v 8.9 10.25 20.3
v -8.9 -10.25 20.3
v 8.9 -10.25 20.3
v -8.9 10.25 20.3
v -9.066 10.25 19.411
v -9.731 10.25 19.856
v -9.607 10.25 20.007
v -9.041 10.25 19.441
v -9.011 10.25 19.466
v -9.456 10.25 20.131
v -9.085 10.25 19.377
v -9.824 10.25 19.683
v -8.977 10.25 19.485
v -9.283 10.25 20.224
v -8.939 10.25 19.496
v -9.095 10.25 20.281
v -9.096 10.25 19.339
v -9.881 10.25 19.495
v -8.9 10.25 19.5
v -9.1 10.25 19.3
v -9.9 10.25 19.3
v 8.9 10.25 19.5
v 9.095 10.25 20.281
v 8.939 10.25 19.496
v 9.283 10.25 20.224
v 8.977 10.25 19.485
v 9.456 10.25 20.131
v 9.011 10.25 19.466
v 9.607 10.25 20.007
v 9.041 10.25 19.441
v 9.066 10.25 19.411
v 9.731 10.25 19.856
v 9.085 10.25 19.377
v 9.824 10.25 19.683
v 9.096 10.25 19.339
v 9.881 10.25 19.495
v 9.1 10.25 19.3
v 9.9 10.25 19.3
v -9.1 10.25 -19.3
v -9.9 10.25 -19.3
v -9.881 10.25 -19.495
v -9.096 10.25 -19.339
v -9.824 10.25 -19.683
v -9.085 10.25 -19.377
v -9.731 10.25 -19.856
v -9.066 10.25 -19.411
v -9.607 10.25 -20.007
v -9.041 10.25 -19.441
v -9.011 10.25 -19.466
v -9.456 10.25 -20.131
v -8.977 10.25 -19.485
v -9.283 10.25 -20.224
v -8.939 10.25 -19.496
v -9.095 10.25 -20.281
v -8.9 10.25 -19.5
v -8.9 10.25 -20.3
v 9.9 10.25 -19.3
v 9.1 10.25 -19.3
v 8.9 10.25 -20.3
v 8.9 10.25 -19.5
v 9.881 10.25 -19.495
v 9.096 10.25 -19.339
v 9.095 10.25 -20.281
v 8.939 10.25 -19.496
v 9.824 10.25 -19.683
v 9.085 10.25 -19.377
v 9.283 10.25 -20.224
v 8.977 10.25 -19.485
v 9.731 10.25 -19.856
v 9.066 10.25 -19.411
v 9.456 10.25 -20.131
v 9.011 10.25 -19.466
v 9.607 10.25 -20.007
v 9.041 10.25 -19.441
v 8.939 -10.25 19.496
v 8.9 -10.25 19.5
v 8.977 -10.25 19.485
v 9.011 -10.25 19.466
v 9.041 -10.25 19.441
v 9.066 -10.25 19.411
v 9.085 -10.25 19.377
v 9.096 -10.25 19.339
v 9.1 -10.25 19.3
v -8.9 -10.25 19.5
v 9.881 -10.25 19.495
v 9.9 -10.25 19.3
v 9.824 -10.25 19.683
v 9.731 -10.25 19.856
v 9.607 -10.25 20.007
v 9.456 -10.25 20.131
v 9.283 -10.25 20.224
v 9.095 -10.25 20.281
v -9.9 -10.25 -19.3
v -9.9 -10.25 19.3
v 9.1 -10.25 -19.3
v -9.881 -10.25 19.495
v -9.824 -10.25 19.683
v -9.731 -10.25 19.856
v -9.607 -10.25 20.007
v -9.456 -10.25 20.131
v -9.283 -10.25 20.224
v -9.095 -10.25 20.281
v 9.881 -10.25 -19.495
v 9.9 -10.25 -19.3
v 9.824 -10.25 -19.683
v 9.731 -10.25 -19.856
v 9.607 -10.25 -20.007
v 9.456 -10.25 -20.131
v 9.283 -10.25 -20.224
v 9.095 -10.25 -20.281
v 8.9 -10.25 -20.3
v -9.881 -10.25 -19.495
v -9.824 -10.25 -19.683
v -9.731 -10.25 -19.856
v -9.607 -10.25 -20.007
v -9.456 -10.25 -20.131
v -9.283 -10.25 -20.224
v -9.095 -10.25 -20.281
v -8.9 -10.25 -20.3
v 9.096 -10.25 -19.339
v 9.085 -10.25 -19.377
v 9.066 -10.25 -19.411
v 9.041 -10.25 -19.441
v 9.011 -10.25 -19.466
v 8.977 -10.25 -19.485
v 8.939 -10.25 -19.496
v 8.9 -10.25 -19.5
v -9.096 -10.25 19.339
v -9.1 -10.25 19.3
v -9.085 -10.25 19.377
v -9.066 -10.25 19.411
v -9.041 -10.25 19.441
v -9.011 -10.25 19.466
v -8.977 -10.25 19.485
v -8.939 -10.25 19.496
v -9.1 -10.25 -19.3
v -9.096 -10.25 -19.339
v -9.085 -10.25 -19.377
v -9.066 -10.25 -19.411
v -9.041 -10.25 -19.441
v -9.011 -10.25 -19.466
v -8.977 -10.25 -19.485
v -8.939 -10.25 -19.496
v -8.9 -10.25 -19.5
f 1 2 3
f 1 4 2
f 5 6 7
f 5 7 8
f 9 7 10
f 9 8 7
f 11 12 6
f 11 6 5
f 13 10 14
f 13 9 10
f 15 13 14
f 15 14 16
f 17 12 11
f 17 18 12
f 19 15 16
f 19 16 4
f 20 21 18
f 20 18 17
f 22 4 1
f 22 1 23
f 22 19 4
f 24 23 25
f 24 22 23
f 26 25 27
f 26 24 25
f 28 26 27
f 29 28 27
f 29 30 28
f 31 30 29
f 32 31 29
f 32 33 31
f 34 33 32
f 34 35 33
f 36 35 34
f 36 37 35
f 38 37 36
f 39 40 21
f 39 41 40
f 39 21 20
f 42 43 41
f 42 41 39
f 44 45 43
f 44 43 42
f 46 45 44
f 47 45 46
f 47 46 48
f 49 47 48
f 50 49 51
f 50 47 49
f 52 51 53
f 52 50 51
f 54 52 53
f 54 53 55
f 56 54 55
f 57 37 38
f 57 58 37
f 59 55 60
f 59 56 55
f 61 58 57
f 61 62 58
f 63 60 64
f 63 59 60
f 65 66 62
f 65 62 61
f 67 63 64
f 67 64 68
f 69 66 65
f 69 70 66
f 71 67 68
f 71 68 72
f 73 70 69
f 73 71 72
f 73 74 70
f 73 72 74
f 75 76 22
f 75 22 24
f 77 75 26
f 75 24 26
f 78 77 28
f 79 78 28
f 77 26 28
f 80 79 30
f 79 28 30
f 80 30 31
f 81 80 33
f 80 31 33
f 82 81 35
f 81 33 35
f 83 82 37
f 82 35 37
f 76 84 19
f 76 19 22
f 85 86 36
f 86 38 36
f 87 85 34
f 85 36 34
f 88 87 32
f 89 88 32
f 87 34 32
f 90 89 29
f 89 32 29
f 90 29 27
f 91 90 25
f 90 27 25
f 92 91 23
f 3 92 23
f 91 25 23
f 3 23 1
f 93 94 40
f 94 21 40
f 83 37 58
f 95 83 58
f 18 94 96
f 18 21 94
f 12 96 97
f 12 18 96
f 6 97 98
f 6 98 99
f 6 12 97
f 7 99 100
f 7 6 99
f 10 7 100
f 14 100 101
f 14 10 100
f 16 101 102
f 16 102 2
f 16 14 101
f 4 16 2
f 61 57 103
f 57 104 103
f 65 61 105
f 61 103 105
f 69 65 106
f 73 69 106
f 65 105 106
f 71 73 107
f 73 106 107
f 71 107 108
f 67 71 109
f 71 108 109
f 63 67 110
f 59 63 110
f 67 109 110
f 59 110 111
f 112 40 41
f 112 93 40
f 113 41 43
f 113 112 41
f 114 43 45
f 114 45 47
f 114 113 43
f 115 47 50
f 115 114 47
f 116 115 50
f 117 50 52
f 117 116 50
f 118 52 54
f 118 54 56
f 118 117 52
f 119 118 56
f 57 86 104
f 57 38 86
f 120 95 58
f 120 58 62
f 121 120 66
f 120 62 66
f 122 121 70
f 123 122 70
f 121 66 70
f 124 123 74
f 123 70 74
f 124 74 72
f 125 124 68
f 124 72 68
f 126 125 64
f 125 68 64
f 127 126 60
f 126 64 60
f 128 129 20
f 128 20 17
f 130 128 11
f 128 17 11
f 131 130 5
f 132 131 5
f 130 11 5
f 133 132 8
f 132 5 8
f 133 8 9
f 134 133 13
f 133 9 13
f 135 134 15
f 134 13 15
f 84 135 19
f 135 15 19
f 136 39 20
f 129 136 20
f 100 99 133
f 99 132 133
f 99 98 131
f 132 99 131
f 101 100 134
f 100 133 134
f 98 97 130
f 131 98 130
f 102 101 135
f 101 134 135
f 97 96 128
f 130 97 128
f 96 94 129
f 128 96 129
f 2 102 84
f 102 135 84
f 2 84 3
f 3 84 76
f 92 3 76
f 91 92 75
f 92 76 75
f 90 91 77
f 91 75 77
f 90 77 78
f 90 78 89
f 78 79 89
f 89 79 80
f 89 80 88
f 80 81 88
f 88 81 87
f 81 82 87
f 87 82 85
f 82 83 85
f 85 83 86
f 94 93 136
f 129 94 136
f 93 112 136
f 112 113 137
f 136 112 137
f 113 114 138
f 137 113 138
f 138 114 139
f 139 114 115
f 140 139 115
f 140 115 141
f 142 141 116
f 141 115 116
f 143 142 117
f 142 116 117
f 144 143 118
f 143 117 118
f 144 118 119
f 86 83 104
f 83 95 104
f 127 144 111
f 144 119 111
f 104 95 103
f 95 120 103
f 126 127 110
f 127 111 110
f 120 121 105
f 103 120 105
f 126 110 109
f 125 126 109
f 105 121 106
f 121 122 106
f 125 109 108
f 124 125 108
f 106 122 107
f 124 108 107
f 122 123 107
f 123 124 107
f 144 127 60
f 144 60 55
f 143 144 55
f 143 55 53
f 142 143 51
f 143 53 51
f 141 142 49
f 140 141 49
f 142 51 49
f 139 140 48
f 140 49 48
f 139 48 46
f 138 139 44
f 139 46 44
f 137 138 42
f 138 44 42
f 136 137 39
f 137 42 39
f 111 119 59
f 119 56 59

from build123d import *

# Parameters (mm, degrees)
BASES_W            = 19.8
BASES_H            = 40.6
BASE_DEPTH         = 10.25
BASE_F_R           = 1
CUT_EXTRUDE3_DEPTH = 21.5


with BuildPart() as part:
    # BaseS → BASE (new body, symmetric)
    with BuildSketch(Plane(origin=(0, 0, 0), x_dir=(1, 0, 0), z_dir=(0, 1, 0))):
        Rectangle(BASES_W, BASES_H)
    extrude(amount=BASE_DEPTH, both=True)

    # BASE F
    base_f_edges = [part.edges().sort_by_distance(p)[0] for p in [
        (9.9, 0, 20.3),
        (-9.9, 0, 20.3),
        (-9.9, 0, -20.3),
        (9.9, 0, -20.3),
    ]]
    fillet(base_f_edges, radius=BASE_F_R)

    # PocketS → Cut-Extrude3 (cut, through all)
    with BuildSketch(Plane(origin=(0, 10.25, 0), x_dir=(1, 0, 0), z_dir=(0, 1, 0))):
        with BuildLine():
            Line((8.9, 19.5), (-8.9, 19.5))
            ThreePointArc((-8.9, 19.5), (-9.041421356, 19.441421356), (-9.1, 19.3))
            Line((-9.1, 19.3), (-9.1, -19.3))
            ThreePointArc((-9.1, -19.3), (-9.041421356, -19.441421356), (-8.9, -19.5))
            Line((-8.9, -19.5), (8.9, -19.5))
            ThreePointArc((8.9, -19.5), (9.041421356, -19.441421356), (9.1, -19.3))
            Line((9.1, -19.3), (9.1, 19.3))
            ThreePointArc((9.1, 19.3), (9.041421356, 19.441421356), (8.9, 19.5))
        make_face()
    extrude(amount=-CUT_EXTRUDE3_DEPTH, mode=Mode.SUBTRACT)


solid = part.part
